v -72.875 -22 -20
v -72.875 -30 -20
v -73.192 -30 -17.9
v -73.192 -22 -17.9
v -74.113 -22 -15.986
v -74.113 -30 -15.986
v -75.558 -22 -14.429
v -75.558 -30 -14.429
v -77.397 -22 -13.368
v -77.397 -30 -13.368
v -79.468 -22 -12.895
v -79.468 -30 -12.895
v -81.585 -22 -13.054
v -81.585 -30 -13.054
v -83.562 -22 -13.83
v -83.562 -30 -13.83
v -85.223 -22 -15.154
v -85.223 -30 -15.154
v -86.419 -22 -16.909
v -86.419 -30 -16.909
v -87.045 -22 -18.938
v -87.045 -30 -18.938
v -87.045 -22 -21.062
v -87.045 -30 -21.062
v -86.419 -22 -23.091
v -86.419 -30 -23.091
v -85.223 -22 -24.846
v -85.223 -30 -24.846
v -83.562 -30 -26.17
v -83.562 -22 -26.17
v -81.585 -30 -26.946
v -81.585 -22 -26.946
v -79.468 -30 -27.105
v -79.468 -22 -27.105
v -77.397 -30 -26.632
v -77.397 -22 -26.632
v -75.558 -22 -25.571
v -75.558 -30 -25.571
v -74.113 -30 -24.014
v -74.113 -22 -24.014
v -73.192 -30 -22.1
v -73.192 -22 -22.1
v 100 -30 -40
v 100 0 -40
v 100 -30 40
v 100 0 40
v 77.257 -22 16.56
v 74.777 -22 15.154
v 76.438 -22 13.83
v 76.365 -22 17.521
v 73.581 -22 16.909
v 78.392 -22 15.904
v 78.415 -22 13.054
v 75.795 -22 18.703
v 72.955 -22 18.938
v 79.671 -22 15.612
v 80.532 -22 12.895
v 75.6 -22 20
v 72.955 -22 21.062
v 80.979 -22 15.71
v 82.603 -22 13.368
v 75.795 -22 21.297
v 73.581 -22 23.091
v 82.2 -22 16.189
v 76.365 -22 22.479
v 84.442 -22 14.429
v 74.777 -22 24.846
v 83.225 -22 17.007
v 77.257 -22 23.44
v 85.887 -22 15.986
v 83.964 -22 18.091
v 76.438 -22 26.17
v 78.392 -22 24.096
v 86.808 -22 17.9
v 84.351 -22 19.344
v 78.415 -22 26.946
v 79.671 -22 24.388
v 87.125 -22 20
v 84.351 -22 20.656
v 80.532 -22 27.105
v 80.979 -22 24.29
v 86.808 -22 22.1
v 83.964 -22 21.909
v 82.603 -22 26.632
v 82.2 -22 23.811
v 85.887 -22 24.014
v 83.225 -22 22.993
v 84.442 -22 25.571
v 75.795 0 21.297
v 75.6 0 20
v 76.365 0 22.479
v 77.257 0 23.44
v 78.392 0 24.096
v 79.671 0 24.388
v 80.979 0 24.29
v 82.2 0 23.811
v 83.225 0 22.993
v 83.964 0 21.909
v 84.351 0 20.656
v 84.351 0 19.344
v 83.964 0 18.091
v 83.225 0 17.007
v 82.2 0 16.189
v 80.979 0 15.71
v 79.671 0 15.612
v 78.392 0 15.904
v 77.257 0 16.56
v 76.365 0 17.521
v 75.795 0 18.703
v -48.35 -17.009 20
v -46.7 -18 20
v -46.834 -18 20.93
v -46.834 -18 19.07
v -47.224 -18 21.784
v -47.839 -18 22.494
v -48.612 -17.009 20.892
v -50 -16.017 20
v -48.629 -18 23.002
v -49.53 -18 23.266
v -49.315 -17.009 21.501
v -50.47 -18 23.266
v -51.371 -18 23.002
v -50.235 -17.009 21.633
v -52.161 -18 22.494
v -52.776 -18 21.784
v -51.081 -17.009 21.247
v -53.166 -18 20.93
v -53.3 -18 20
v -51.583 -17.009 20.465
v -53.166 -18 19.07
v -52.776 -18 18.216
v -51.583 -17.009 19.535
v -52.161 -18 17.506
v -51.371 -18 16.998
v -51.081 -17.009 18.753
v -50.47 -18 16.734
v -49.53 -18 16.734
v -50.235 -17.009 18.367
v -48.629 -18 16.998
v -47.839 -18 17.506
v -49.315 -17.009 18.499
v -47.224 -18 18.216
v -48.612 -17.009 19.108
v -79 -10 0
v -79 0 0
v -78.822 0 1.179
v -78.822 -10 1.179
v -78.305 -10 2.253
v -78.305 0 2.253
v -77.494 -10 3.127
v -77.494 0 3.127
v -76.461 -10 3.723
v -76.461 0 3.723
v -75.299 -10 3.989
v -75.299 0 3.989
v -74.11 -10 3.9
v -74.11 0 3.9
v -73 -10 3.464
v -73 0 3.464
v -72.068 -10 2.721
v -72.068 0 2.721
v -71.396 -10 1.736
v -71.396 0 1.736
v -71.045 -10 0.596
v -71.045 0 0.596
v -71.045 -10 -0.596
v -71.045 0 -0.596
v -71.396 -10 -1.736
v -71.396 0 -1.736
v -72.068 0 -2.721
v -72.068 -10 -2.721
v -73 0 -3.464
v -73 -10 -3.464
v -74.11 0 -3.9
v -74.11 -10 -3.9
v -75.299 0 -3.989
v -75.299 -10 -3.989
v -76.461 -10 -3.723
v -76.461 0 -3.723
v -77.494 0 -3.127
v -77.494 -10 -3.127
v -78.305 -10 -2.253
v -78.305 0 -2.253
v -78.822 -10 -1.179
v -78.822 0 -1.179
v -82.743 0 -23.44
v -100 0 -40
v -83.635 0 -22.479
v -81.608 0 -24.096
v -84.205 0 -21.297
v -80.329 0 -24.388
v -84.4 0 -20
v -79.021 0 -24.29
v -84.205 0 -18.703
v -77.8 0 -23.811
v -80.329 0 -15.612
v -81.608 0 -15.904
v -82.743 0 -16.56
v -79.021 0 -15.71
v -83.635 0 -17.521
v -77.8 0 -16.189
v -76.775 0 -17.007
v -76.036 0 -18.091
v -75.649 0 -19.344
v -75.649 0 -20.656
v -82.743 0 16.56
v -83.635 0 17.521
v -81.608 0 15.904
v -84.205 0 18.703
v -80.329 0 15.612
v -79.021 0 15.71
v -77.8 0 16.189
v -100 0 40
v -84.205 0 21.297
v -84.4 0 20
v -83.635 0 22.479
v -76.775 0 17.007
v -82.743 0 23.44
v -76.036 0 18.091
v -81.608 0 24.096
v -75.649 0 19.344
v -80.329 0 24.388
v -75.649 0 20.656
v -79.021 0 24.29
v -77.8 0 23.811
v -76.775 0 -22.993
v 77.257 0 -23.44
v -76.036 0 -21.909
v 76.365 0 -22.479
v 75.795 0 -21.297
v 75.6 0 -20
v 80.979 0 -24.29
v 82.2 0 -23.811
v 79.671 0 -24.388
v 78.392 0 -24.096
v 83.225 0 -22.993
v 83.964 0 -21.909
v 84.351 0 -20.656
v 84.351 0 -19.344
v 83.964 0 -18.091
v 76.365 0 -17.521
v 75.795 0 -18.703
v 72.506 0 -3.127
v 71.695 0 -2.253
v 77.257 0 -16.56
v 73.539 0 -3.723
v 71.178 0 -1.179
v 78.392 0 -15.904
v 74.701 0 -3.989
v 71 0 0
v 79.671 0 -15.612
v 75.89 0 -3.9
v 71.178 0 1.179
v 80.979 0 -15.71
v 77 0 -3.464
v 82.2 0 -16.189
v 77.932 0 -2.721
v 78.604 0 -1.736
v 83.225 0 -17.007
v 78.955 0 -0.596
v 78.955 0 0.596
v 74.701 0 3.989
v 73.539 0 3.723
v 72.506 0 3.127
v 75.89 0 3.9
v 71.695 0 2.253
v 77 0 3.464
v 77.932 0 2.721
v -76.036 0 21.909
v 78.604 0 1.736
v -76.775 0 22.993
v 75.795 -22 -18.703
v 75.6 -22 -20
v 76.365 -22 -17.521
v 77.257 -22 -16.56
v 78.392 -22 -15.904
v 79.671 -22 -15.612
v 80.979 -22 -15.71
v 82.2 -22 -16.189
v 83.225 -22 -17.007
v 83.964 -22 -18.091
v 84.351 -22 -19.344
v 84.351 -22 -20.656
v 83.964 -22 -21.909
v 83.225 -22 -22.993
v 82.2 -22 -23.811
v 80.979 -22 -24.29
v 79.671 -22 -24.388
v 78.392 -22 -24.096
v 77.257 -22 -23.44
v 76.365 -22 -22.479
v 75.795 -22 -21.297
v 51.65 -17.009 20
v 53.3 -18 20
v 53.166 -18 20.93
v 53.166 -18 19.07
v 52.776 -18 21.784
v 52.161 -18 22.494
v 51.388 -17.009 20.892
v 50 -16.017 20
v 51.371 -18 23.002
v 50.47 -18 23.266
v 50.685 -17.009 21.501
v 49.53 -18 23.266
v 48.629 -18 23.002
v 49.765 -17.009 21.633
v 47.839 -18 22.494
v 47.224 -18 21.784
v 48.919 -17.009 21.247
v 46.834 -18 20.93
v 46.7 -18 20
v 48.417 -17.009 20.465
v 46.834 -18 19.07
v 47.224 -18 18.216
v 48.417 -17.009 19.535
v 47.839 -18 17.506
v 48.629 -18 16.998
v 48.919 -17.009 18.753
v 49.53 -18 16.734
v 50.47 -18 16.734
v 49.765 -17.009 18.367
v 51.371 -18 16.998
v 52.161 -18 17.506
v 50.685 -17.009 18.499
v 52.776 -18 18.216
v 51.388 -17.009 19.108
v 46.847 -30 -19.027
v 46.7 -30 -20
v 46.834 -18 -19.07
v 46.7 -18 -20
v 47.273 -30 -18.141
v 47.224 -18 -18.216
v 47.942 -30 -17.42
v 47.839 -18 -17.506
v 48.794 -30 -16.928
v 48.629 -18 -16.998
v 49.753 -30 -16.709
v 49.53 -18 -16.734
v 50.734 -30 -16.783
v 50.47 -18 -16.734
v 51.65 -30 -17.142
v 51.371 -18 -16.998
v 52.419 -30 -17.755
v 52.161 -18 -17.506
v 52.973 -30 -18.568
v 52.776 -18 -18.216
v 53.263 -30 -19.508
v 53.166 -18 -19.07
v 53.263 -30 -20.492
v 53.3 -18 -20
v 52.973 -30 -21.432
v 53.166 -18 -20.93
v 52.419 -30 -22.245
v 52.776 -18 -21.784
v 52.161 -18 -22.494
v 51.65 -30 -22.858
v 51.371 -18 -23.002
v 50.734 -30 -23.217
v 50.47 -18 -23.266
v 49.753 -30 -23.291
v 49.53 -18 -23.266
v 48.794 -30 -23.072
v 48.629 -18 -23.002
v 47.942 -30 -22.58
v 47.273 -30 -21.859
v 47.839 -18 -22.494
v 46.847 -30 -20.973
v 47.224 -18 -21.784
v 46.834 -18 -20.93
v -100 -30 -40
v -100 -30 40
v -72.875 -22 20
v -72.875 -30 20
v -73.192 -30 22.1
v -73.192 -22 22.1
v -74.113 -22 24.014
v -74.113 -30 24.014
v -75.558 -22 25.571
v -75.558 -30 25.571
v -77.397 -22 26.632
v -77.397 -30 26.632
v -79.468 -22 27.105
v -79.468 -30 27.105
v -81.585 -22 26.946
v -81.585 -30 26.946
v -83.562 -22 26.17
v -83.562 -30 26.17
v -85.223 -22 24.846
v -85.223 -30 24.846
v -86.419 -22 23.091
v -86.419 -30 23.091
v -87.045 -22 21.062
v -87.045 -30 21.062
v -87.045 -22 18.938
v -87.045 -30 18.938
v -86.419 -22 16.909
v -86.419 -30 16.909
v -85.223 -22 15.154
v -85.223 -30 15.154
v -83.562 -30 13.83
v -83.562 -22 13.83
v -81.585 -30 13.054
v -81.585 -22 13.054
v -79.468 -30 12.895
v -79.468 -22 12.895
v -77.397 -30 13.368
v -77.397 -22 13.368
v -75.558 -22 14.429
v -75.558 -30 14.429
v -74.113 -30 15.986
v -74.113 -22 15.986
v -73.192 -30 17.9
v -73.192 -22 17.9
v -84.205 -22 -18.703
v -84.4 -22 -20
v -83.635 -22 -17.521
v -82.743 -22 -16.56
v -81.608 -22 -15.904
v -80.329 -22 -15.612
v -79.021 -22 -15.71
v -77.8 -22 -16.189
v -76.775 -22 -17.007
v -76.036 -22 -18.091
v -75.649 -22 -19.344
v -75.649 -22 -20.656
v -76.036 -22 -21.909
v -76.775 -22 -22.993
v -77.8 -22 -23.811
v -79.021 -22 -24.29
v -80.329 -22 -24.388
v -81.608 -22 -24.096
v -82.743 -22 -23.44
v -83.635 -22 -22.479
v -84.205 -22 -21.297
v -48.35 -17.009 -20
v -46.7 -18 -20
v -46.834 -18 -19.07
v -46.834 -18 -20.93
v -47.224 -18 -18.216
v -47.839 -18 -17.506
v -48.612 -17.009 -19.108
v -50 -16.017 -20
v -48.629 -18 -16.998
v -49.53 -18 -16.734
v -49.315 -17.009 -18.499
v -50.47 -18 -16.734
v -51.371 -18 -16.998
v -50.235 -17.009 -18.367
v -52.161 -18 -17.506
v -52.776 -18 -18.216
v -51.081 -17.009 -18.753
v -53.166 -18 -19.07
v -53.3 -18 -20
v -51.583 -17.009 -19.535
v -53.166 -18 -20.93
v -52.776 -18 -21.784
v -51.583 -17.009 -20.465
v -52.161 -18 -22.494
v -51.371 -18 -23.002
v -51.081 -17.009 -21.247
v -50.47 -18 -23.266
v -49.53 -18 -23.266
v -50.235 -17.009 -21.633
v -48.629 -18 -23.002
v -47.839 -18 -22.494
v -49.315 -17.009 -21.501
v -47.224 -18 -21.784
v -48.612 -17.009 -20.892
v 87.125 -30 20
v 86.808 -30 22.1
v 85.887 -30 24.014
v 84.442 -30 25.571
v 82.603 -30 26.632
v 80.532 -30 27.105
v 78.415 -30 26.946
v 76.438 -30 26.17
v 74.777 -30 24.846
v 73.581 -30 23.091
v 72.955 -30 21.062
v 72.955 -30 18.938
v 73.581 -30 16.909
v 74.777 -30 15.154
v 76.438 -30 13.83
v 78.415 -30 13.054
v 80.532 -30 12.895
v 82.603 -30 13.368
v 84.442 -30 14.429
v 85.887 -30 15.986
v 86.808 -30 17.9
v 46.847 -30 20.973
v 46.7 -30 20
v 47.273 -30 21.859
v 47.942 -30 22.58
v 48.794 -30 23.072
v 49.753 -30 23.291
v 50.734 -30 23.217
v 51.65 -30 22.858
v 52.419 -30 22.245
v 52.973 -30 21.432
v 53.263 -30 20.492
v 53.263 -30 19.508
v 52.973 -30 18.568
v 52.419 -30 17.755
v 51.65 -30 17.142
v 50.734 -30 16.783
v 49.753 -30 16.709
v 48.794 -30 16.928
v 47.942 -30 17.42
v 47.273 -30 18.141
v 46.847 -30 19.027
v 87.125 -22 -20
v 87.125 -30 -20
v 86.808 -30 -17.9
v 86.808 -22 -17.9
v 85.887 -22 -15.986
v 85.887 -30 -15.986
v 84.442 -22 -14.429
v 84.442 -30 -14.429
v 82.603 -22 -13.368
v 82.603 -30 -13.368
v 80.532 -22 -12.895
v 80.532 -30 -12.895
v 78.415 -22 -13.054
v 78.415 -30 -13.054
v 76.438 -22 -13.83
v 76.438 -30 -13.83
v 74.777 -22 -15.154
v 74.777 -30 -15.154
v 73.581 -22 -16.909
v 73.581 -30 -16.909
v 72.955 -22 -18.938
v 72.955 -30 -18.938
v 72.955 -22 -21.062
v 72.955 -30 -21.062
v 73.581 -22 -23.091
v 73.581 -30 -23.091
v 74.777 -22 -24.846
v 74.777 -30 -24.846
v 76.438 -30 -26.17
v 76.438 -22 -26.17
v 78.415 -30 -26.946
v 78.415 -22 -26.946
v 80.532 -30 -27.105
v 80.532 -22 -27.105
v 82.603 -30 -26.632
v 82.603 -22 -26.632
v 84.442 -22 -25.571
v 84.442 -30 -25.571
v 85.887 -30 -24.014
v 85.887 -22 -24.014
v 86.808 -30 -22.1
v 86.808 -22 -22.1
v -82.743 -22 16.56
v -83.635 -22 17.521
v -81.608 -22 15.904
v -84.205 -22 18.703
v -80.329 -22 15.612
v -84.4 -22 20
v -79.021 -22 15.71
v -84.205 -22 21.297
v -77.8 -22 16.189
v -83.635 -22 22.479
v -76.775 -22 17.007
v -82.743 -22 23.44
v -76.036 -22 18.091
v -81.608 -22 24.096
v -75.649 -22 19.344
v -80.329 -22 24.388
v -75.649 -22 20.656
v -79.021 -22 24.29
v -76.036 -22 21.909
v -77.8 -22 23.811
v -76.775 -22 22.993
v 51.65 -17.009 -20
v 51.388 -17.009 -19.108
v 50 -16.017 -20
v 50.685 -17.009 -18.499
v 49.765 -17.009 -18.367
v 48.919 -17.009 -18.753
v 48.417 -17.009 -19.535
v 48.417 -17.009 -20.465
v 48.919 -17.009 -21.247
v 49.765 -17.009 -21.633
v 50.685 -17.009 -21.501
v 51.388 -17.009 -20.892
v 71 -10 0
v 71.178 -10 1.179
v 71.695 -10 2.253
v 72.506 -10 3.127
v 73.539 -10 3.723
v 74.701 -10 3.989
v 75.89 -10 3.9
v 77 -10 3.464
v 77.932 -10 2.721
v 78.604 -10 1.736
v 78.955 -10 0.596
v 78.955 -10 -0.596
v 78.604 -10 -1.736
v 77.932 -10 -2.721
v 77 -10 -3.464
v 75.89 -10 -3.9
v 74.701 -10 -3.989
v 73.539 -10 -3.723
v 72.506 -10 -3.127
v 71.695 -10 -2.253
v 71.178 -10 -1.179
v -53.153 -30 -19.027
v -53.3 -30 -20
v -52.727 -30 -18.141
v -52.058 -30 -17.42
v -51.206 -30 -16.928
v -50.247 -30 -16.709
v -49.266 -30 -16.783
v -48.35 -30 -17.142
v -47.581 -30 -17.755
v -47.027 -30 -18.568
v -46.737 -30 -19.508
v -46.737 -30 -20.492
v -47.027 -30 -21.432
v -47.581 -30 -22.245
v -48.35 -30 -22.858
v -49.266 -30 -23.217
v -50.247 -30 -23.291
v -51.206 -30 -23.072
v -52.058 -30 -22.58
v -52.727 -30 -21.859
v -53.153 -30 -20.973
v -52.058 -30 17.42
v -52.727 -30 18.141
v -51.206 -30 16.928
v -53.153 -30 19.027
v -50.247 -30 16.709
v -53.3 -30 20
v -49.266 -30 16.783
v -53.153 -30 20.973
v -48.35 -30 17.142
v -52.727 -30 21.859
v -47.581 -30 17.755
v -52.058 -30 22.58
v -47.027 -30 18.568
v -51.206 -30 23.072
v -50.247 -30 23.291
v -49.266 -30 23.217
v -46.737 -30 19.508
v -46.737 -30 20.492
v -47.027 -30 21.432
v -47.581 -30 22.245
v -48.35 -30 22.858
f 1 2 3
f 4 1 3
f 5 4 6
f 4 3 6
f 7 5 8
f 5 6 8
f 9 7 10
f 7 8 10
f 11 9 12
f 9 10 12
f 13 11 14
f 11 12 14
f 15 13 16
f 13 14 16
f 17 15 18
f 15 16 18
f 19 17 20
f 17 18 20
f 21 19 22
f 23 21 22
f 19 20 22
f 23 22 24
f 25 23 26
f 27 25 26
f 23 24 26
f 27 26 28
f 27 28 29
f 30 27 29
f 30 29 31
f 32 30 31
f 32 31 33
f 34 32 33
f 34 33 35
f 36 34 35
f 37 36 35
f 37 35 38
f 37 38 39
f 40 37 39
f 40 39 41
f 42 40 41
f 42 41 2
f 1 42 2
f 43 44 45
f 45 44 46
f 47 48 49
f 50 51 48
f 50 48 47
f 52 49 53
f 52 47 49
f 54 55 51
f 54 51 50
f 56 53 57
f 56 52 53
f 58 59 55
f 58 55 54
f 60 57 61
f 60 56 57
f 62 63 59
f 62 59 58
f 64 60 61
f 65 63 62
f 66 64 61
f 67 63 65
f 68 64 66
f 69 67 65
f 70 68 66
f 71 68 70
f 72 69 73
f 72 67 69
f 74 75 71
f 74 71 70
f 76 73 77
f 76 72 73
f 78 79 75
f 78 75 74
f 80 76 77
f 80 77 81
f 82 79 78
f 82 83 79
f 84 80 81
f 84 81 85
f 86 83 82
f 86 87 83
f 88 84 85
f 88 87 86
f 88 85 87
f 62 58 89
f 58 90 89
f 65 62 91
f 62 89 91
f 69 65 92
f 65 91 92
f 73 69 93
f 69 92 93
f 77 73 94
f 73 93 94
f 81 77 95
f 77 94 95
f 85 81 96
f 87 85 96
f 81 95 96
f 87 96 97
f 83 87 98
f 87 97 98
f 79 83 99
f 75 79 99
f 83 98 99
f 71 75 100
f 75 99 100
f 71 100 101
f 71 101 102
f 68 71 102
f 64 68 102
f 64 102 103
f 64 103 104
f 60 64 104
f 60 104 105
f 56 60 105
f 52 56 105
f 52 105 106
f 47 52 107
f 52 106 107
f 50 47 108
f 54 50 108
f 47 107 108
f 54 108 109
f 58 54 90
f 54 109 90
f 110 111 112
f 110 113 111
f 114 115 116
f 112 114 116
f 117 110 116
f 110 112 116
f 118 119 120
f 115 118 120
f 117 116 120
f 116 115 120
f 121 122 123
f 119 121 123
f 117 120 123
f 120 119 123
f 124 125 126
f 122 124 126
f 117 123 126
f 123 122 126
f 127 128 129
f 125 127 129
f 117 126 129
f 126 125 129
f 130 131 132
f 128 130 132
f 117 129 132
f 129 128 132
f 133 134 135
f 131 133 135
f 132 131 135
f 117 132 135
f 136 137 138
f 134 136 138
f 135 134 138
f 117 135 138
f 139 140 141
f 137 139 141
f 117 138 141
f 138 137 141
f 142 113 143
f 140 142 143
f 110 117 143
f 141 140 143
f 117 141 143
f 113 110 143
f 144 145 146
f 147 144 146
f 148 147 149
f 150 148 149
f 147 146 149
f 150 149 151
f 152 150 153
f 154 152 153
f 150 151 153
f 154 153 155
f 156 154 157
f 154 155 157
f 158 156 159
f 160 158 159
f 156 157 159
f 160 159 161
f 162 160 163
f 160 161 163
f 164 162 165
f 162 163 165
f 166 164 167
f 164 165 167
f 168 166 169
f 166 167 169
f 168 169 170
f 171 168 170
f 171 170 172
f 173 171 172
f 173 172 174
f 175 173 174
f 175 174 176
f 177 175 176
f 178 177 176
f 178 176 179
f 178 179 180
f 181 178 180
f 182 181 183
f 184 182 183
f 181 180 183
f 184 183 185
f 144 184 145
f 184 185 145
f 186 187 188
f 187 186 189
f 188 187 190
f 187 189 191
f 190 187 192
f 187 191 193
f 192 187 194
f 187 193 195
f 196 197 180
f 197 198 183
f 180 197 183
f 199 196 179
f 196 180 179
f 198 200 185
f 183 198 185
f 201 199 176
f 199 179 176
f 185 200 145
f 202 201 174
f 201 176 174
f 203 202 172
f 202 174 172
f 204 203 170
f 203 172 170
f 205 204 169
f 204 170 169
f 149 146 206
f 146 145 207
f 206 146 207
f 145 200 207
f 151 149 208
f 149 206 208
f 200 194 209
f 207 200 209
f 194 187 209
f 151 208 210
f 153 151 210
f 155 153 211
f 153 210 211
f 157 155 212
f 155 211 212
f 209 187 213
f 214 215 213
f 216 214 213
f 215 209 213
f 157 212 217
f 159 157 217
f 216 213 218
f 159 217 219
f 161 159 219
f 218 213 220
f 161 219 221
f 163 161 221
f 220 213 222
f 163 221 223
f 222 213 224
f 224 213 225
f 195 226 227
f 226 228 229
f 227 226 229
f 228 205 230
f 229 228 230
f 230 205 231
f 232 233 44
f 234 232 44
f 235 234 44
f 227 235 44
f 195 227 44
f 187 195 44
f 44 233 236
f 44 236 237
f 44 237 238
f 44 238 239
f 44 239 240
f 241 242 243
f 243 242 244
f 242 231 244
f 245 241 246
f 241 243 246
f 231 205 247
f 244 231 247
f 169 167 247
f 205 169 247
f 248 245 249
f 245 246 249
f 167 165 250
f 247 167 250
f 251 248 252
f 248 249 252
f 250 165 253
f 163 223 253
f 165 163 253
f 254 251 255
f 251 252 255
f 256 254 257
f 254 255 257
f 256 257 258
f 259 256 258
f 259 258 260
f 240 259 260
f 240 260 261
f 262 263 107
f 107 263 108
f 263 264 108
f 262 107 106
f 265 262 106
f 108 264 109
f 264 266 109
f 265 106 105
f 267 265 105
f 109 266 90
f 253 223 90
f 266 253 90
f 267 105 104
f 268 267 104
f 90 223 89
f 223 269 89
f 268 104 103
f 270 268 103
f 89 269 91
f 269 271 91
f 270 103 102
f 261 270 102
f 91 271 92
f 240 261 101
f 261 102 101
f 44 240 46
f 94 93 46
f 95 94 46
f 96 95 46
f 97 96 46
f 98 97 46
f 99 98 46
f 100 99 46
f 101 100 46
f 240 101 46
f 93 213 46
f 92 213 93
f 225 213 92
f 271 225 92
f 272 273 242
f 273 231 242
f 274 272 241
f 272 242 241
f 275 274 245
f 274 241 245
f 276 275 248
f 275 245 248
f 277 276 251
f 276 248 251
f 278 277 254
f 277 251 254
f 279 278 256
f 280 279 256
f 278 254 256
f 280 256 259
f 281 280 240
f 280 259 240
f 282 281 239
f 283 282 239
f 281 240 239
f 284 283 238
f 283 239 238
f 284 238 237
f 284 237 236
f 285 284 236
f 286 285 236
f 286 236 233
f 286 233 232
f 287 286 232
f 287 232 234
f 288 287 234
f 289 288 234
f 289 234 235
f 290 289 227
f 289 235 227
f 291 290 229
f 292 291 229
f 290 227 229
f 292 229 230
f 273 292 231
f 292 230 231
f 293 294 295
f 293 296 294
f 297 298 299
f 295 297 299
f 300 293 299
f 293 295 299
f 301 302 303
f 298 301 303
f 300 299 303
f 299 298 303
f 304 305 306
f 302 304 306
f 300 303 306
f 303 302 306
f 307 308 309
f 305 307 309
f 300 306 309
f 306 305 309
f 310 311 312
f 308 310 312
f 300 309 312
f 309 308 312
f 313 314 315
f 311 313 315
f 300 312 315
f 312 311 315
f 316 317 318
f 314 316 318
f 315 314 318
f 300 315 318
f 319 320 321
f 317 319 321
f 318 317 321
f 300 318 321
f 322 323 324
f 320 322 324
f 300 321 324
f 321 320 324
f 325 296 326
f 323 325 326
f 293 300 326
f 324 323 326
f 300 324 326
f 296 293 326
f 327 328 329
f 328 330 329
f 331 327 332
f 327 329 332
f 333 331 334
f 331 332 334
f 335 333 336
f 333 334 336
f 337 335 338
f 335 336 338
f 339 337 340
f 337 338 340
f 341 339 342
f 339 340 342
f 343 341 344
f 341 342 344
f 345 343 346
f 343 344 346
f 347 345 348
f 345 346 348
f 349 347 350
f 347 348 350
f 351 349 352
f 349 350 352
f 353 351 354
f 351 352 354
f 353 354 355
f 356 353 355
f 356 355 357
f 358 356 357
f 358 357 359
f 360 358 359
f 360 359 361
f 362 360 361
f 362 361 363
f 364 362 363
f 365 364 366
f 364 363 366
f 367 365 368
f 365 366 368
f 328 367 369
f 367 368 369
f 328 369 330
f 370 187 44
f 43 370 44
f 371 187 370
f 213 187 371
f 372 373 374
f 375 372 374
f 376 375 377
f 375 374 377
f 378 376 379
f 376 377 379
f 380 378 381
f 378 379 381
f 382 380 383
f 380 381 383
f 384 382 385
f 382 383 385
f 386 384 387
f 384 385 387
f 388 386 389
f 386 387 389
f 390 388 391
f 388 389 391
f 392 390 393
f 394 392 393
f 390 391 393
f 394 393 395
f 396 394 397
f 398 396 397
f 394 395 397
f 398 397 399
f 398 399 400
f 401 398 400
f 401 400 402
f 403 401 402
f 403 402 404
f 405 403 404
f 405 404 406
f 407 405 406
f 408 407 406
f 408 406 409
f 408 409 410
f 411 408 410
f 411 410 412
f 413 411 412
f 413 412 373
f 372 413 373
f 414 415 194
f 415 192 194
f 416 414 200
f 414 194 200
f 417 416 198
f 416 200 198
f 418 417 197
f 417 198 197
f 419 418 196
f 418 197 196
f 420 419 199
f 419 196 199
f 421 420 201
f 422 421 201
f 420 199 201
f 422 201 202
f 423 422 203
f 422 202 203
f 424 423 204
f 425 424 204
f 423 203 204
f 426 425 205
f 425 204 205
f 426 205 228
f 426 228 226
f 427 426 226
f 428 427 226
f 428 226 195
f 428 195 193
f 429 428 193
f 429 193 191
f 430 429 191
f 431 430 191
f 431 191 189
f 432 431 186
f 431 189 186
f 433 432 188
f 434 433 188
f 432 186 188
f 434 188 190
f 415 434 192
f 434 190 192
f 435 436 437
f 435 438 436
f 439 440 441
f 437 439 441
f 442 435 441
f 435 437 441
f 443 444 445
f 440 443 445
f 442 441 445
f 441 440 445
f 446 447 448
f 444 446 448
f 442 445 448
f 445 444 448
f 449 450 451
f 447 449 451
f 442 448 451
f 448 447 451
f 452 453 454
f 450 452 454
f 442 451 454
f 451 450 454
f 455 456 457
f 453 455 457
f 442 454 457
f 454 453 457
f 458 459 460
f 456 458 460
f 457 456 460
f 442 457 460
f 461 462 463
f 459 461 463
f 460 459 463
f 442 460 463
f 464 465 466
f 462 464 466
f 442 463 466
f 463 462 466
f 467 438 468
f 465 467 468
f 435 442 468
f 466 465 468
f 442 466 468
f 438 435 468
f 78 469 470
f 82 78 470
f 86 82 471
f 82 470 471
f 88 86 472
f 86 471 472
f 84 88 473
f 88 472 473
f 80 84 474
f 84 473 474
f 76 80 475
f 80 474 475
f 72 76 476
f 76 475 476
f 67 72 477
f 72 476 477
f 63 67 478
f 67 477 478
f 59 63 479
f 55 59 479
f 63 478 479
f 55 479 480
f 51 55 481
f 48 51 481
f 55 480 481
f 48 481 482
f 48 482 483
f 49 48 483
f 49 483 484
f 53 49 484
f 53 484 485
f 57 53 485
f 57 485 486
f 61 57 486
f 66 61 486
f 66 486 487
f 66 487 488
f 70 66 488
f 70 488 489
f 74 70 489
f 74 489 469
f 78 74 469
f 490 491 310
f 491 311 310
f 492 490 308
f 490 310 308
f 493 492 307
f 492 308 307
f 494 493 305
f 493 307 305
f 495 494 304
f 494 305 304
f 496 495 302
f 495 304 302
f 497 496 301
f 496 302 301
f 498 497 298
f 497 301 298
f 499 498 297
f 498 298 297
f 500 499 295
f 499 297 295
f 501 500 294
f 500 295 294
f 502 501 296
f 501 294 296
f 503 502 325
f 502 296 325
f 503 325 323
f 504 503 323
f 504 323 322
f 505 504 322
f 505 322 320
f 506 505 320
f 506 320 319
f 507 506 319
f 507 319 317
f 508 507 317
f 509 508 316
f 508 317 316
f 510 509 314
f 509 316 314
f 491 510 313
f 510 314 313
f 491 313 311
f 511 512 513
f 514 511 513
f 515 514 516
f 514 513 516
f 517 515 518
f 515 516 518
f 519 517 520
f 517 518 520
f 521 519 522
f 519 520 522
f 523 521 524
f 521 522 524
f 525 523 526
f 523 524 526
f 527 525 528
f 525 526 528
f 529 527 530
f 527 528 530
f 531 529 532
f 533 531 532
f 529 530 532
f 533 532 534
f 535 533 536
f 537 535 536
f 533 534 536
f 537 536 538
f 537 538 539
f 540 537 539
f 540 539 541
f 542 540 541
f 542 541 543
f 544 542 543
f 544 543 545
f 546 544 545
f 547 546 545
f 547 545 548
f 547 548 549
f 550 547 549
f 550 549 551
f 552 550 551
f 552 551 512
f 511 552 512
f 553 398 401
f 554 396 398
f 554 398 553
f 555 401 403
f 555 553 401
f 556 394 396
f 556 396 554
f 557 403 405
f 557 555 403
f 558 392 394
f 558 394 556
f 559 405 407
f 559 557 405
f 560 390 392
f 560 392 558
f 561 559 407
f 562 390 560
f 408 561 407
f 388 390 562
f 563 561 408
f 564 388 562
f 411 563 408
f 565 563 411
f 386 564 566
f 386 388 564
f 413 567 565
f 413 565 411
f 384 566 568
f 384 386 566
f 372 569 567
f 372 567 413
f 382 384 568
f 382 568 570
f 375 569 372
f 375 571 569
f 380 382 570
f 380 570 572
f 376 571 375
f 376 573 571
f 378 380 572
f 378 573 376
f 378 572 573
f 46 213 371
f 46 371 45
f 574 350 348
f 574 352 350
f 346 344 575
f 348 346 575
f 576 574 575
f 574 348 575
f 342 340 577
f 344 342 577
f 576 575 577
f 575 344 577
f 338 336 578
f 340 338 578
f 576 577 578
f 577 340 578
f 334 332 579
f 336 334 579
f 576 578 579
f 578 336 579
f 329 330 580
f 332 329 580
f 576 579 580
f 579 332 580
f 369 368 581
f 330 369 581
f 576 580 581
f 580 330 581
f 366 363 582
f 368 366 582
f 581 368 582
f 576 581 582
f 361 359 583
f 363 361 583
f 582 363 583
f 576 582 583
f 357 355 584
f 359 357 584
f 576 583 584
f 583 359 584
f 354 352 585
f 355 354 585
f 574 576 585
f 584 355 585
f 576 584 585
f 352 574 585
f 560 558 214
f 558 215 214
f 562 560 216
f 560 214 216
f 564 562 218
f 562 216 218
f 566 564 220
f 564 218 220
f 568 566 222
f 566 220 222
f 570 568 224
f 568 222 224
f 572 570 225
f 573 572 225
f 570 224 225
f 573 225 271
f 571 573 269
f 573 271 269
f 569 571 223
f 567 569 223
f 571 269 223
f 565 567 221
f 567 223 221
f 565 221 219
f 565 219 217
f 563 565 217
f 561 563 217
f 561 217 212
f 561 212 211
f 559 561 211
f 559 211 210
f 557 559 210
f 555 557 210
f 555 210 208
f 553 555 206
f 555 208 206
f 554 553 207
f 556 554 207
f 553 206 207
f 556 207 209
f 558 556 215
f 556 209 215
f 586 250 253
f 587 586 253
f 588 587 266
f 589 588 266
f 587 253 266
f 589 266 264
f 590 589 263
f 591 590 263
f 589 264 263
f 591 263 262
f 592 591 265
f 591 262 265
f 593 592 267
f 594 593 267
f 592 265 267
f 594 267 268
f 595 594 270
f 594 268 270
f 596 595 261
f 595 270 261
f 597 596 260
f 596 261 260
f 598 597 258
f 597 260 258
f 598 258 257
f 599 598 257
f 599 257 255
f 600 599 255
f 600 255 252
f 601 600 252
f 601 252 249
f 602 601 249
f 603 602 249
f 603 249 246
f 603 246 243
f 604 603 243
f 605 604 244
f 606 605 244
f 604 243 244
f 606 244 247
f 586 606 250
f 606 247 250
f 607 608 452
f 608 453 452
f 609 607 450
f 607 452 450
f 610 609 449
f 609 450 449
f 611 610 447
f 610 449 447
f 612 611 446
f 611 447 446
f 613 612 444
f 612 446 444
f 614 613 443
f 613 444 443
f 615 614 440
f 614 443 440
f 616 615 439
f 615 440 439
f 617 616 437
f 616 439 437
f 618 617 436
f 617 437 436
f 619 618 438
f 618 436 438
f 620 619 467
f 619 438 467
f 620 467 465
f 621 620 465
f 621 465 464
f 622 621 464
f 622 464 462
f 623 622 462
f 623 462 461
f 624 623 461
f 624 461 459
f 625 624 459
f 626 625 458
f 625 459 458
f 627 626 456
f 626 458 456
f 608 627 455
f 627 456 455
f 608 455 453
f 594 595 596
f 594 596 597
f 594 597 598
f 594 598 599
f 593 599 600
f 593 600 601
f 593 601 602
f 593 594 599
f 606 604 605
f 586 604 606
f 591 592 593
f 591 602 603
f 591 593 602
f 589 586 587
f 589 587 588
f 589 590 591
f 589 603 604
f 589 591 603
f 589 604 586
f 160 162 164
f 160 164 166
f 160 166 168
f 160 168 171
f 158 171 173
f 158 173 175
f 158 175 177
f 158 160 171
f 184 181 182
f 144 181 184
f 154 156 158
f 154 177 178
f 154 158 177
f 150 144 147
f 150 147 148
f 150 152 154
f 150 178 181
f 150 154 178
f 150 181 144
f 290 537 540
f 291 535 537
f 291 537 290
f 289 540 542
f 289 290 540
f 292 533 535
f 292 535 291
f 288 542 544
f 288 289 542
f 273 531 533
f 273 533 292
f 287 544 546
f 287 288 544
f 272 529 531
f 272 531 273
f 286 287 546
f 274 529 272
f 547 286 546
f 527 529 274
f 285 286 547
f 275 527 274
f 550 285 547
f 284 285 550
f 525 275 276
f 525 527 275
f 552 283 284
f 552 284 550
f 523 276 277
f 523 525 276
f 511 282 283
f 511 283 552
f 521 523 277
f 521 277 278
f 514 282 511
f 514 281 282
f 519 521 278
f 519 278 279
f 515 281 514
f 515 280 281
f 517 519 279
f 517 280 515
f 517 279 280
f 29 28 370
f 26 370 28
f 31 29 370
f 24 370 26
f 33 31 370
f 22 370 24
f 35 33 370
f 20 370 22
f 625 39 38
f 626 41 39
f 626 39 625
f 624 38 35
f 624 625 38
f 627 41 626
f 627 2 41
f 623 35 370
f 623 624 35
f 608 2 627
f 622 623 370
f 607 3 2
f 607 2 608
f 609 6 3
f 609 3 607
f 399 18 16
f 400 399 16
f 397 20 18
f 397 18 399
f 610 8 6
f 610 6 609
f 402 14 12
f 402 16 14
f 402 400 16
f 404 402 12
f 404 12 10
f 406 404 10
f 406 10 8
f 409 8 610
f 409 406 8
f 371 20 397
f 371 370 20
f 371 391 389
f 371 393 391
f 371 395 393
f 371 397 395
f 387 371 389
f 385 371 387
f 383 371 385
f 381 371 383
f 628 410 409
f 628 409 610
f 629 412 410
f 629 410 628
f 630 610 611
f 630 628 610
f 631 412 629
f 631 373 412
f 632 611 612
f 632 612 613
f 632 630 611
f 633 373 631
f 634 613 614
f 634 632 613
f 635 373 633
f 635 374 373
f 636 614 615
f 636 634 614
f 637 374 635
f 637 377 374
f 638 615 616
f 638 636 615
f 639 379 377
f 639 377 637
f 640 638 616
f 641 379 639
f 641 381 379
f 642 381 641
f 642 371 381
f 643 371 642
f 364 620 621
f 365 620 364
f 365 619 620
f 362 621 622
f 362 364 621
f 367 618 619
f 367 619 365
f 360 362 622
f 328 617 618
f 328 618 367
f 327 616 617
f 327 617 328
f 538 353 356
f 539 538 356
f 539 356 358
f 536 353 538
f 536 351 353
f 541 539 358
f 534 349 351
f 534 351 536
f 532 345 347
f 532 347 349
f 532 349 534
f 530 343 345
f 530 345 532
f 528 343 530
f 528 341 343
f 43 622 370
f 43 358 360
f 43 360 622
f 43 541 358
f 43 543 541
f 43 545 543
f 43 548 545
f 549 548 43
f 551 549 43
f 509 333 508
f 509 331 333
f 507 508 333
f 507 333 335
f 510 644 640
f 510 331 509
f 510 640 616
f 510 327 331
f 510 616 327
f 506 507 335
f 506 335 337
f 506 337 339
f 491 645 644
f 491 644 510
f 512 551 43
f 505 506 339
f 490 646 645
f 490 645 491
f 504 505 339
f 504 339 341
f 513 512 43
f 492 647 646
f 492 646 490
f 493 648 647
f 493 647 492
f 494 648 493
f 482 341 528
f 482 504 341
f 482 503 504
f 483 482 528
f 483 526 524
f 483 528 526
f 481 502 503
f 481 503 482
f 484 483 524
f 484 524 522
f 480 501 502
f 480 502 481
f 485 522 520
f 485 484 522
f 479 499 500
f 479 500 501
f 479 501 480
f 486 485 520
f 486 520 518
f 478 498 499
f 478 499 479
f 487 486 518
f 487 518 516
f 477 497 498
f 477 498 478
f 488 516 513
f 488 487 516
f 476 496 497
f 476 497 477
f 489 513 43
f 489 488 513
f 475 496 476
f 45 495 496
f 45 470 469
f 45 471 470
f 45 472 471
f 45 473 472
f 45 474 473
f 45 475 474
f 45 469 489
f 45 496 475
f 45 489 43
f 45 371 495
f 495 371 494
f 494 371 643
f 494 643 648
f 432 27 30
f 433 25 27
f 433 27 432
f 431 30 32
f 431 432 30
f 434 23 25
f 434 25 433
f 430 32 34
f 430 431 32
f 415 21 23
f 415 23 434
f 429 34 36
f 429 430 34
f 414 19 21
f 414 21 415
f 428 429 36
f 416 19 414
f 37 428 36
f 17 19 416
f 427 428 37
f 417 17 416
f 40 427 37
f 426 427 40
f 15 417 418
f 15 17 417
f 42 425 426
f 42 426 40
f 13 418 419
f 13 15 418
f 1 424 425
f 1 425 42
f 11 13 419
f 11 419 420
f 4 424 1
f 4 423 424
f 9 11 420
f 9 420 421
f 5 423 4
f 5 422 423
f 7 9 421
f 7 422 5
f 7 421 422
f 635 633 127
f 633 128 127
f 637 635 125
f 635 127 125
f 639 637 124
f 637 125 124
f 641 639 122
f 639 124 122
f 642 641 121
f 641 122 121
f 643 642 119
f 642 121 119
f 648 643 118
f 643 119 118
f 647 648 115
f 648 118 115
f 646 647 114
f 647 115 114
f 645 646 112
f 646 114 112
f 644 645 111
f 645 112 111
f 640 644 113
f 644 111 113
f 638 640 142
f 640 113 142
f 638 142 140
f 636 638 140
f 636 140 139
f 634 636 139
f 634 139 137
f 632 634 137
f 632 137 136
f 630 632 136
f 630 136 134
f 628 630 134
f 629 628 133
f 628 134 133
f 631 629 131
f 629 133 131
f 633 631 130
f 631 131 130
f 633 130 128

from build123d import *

# Parameters (mm, degrees)
F0_W           = 200
F0_H           = 80
F1_DEPTH       = 30
F2_R           = 4
F3_DEPTH       = 10
F5_D           = 8.8
F5_CBORE_D     = 14.25
F5_CBORE_DEPTH = 8
F7_D           = 6.6
F7_DEPTH       = 12
F7_TIP         = 1.9828400428


with BuildPart() as f1:
    # F0 (on Front) → F1 (new body)
    with BuildSketch(Plane.XZ):
        Rectangle(F0_W, F0_H)
    extrude(amount=F1_DEPTH)

    # F2 (on face) → F3 (cut)
    with BuildSketch(Plane(origin=(0, 0, 0), x_dir=(-1, 0, 0), z_dir=(0, 1, 0))):
        with Locations((-75, 0)):
            Circle(F2_R)
        with Locations((75, 0)):
            Circle(F2_R)
    extrude(amount=-F3_DEPTH, mode=Mode.SUBTRACT)

    # F5 (through all)
    with Locations(Plane.XZ.offset(30)):
        with Locations((-80, 20), (-80, -20), (80, 20), (80, -20)):
            CounterBoreHole(F5_D / 2, F5_CBORE_D / 2, F5_CBORE_DEPTH)

    # F7
    with Locations(Plane.XZ.offset(30)):
        with Locations((-50, -20), (-50, 20), (50, 20), (50, -20)):
            Hole(F7_D / 2, depth=F7_DEPTH)
            with Locations((0, 0, -(F7_DEPTH + F7_TIP / 2))):  # 118° drill point
                Cone(0, F7_D / 2, F7_TIP, mode=Mode.SUBTRACT)


solid = f1.part
